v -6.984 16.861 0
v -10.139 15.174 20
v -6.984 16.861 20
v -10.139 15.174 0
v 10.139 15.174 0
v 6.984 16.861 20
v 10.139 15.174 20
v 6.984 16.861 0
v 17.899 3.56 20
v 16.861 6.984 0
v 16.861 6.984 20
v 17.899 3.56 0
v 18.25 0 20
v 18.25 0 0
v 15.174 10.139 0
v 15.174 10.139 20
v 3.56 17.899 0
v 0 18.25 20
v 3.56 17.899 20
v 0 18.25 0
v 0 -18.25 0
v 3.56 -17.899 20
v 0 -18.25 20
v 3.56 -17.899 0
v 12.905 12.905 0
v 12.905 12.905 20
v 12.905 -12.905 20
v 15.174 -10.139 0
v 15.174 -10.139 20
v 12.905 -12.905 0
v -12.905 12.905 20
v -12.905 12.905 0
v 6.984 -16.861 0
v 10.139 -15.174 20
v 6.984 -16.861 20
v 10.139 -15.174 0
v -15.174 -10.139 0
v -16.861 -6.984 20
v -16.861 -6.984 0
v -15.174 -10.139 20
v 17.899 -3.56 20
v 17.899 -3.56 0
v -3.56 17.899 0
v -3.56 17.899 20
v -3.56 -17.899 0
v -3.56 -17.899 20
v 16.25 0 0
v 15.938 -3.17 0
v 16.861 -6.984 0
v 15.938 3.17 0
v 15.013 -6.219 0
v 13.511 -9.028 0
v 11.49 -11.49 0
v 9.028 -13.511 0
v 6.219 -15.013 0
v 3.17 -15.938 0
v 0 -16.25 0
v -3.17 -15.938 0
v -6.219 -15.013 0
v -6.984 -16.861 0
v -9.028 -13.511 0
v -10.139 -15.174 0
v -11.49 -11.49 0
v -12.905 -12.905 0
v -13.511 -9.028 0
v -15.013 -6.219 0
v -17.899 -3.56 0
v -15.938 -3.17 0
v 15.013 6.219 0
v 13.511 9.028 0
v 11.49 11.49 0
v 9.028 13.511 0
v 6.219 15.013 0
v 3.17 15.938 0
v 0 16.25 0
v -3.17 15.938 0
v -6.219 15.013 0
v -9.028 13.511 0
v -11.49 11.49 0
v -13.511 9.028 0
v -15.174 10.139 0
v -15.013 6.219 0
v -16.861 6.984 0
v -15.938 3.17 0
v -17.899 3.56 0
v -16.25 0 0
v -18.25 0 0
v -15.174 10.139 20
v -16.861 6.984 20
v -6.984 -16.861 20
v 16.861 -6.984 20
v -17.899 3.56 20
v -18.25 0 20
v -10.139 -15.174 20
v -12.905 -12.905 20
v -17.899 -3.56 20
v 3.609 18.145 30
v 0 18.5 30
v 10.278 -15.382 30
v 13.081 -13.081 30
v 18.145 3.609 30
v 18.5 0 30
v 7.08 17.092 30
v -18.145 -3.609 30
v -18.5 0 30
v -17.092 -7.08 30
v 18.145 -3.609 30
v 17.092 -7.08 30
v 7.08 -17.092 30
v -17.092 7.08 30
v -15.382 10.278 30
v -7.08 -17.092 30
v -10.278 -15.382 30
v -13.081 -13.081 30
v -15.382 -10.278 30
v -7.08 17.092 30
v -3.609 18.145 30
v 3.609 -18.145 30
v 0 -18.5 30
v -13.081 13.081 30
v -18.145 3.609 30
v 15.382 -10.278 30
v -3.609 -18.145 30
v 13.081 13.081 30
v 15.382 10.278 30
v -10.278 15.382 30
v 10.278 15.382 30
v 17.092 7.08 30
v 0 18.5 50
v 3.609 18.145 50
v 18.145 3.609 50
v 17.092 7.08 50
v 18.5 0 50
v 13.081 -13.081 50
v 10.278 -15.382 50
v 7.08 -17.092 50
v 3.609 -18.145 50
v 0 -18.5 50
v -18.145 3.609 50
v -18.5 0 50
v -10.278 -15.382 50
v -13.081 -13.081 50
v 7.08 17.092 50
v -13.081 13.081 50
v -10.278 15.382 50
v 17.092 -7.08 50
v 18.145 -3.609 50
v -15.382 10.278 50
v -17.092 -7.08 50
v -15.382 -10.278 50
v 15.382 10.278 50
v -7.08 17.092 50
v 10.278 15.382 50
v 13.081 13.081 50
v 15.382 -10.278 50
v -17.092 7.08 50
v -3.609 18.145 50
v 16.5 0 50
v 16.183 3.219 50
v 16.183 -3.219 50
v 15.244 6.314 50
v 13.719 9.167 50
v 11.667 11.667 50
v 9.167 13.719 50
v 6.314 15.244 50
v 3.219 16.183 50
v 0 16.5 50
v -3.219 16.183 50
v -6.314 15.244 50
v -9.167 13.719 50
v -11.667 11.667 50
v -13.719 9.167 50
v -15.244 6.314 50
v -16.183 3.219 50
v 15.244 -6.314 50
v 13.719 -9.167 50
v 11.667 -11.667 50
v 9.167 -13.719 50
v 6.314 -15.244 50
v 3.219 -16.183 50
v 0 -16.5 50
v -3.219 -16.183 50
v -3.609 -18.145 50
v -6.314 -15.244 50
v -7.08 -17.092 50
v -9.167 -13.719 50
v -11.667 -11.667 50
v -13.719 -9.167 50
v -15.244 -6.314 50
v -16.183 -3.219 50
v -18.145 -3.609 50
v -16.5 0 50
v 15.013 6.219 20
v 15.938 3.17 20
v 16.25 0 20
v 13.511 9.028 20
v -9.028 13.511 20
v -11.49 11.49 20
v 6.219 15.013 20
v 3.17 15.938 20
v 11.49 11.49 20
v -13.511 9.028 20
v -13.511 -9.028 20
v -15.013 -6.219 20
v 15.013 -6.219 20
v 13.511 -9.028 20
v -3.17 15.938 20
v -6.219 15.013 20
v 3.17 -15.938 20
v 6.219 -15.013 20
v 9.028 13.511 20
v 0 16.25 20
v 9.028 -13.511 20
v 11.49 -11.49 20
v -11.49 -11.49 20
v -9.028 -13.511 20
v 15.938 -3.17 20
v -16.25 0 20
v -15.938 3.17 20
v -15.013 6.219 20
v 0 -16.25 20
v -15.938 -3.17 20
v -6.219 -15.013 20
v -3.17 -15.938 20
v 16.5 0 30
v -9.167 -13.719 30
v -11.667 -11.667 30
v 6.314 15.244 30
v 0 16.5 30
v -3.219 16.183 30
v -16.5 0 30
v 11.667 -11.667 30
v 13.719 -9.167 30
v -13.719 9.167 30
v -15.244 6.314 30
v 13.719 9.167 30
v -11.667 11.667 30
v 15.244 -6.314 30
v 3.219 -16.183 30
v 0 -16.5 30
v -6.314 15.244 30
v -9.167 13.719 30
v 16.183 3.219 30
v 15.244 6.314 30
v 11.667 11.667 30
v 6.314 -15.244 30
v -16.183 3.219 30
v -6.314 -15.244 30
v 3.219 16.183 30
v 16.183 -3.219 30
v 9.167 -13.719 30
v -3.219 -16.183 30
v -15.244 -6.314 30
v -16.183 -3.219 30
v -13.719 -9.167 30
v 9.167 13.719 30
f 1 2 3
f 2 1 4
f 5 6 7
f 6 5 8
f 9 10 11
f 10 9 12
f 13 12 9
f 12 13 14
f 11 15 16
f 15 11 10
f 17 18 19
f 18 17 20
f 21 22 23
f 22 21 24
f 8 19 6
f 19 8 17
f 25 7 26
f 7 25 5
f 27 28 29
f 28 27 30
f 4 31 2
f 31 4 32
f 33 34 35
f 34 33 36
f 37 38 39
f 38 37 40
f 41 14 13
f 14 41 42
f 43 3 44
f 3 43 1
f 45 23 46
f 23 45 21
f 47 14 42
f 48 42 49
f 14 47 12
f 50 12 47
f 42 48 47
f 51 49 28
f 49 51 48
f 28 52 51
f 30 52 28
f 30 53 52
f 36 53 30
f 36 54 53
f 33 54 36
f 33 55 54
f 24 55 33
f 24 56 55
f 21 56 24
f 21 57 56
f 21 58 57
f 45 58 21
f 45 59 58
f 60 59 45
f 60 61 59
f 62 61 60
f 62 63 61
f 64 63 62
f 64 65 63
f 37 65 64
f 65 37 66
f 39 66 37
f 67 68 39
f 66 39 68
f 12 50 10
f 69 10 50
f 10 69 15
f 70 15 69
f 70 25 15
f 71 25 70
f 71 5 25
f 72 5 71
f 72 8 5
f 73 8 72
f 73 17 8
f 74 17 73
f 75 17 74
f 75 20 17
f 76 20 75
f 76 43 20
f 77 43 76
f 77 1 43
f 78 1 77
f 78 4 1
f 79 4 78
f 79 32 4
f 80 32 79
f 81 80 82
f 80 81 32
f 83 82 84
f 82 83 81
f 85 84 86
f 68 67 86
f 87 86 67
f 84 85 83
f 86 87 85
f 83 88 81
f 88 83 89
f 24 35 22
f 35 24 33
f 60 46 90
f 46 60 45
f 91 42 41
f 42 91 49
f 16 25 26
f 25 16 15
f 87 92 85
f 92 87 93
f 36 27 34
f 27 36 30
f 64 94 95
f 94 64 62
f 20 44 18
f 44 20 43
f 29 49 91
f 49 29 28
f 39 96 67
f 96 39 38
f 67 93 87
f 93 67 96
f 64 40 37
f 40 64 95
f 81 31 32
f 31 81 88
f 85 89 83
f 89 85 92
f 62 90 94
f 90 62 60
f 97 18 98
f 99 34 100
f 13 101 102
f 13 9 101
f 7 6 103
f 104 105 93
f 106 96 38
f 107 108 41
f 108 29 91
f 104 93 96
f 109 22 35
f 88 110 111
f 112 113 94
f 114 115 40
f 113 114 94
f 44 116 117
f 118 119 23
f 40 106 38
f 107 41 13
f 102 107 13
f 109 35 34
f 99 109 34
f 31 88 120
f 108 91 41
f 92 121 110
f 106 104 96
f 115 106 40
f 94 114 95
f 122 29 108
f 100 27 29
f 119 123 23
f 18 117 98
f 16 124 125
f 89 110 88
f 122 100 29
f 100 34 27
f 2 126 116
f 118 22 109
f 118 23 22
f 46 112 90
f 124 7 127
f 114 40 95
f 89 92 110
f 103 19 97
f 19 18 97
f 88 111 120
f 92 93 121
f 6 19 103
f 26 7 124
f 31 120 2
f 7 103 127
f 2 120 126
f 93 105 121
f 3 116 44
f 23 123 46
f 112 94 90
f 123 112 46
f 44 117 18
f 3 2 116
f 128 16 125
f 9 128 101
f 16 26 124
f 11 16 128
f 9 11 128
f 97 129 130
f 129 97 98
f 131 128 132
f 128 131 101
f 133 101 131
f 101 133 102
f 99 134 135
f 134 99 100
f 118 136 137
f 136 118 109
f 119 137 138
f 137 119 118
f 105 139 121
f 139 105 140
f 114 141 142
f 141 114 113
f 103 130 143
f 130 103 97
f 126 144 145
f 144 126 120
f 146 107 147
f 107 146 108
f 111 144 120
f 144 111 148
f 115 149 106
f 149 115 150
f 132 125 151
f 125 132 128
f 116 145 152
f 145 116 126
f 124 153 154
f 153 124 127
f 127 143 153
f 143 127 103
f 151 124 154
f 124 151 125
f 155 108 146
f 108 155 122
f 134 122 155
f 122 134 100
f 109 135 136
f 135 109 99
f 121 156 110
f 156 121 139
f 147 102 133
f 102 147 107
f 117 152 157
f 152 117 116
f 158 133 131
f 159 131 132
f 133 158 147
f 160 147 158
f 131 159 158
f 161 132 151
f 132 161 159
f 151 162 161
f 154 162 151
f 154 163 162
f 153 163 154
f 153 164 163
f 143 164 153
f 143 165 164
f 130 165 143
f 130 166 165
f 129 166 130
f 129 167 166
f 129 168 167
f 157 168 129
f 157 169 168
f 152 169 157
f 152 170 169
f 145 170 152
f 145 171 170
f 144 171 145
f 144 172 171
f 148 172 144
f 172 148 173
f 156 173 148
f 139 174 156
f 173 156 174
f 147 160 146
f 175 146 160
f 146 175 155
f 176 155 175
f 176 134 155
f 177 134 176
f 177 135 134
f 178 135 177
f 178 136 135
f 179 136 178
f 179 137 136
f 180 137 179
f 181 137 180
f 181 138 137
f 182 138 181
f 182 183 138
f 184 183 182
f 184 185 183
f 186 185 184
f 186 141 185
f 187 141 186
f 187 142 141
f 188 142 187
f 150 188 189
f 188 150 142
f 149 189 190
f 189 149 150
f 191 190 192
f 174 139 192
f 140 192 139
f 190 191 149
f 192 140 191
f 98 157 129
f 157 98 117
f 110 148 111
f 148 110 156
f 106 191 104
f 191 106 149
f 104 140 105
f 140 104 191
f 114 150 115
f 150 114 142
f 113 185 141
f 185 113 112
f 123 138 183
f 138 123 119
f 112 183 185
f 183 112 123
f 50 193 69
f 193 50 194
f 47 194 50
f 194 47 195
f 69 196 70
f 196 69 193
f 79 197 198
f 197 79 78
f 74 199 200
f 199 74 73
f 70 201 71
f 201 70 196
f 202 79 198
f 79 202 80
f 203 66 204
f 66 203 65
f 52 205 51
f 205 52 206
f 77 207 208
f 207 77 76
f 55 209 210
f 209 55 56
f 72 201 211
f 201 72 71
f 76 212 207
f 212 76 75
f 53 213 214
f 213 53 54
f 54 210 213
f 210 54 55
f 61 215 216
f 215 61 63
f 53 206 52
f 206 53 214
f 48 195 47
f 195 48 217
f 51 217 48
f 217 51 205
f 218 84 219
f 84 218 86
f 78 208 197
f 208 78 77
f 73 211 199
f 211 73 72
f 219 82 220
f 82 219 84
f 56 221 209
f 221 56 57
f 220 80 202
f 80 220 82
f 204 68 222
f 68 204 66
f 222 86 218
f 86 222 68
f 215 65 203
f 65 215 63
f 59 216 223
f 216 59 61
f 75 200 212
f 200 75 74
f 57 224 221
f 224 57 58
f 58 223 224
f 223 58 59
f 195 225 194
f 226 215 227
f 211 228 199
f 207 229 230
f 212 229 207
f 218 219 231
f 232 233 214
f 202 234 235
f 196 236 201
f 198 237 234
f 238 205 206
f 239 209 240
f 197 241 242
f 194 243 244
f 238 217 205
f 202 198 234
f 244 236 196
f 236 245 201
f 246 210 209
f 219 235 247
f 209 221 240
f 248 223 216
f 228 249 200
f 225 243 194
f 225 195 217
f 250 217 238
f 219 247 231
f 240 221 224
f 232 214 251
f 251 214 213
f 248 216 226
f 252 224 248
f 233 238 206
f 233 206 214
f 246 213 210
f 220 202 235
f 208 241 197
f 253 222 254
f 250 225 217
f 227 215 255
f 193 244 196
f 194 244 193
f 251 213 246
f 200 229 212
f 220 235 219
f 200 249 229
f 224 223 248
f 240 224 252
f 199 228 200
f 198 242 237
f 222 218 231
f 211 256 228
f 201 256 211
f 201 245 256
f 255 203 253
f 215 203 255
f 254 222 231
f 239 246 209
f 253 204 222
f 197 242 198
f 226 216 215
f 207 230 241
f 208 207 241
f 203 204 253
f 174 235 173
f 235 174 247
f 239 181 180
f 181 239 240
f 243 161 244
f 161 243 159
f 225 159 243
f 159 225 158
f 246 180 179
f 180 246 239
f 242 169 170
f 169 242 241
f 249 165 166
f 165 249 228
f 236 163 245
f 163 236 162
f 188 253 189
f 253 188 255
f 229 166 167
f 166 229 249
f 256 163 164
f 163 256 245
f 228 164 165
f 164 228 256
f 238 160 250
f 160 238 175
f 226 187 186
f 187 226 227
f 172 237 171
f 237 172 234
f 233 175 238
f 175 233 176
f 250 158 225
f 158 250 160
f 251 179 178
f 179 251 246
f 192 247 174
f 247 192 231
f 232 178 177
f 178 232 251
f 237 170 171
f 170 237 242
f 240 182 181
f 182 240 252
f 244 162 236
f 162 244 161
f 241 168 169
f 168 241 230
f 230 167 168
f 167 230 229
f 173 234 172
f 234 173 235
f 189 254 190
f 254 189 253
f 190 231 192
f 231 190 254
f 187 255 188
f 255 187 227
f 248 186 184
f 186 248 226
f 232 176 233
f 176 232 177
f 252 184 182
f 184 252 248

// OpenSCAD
/**
 * Hose adapter for Makita vacuums and dust extractors.
 *
 * This adapter fits inside tool dust ports and enables them to be connected to
 * Makita vacuums.
 */

/**
 * The height of the adapter's end sections. These sections fit into the dust
 * port and vacuum hose.
 */
END_SECTION_HEIGHT = 20;

/**
 * The height of the adapter's middle section. This section connects the two end
 * sections.
 */
MIDDLE_SECTION_HEIGHT = 10;

/**
 * Creates a hose adapter.
 *
 * @param d1 The inside diameter of the dust port.
 * @param d2 The inside diameter of the vacuum hose.
 * @param thickness The adapter thickness.
 */
module hose_adapter(d1, d2, thickness) {
  module shell(d1, d2) {
    cylinder(h=END_SECTION_HEIGHT, d=d1, $fn=32);
    translate([0, 0, END_SECTION_HEIGHT])
        cylinder(h=MIDDLE_SECTION_HEIGHT, d1=d1, d2=d2, $fn=32);
    translate([0, 0, END_SECTION_HEIGHT + MIDDLE_SECTION_HEIGHT])
        cylinder(h=END_SECTION_HEIGHT, d=d2, $fn=32);
  }
    
  difference() {
    shell(d1, d2);
    shell(d1 - 2 * thickness, d2 - 2 * thickness);
  }
}

hose_adapter_thickness = 2;
makita_dust_extractor_port_diameter = 37;

// dust_port_diameter = 30.5;  // Kreg pocket hole jig K4
// dust_port_diameter = 31.5;  // Ryobi P411 cordless random orbit sander
dust_port_diameter = 36.5;  // DeWalt DW618 router plunge base

hose_adapter(
    dust_port_diameter,
    makita_dust_extractor_port_diameter,
    hose_adapter_thickness);
